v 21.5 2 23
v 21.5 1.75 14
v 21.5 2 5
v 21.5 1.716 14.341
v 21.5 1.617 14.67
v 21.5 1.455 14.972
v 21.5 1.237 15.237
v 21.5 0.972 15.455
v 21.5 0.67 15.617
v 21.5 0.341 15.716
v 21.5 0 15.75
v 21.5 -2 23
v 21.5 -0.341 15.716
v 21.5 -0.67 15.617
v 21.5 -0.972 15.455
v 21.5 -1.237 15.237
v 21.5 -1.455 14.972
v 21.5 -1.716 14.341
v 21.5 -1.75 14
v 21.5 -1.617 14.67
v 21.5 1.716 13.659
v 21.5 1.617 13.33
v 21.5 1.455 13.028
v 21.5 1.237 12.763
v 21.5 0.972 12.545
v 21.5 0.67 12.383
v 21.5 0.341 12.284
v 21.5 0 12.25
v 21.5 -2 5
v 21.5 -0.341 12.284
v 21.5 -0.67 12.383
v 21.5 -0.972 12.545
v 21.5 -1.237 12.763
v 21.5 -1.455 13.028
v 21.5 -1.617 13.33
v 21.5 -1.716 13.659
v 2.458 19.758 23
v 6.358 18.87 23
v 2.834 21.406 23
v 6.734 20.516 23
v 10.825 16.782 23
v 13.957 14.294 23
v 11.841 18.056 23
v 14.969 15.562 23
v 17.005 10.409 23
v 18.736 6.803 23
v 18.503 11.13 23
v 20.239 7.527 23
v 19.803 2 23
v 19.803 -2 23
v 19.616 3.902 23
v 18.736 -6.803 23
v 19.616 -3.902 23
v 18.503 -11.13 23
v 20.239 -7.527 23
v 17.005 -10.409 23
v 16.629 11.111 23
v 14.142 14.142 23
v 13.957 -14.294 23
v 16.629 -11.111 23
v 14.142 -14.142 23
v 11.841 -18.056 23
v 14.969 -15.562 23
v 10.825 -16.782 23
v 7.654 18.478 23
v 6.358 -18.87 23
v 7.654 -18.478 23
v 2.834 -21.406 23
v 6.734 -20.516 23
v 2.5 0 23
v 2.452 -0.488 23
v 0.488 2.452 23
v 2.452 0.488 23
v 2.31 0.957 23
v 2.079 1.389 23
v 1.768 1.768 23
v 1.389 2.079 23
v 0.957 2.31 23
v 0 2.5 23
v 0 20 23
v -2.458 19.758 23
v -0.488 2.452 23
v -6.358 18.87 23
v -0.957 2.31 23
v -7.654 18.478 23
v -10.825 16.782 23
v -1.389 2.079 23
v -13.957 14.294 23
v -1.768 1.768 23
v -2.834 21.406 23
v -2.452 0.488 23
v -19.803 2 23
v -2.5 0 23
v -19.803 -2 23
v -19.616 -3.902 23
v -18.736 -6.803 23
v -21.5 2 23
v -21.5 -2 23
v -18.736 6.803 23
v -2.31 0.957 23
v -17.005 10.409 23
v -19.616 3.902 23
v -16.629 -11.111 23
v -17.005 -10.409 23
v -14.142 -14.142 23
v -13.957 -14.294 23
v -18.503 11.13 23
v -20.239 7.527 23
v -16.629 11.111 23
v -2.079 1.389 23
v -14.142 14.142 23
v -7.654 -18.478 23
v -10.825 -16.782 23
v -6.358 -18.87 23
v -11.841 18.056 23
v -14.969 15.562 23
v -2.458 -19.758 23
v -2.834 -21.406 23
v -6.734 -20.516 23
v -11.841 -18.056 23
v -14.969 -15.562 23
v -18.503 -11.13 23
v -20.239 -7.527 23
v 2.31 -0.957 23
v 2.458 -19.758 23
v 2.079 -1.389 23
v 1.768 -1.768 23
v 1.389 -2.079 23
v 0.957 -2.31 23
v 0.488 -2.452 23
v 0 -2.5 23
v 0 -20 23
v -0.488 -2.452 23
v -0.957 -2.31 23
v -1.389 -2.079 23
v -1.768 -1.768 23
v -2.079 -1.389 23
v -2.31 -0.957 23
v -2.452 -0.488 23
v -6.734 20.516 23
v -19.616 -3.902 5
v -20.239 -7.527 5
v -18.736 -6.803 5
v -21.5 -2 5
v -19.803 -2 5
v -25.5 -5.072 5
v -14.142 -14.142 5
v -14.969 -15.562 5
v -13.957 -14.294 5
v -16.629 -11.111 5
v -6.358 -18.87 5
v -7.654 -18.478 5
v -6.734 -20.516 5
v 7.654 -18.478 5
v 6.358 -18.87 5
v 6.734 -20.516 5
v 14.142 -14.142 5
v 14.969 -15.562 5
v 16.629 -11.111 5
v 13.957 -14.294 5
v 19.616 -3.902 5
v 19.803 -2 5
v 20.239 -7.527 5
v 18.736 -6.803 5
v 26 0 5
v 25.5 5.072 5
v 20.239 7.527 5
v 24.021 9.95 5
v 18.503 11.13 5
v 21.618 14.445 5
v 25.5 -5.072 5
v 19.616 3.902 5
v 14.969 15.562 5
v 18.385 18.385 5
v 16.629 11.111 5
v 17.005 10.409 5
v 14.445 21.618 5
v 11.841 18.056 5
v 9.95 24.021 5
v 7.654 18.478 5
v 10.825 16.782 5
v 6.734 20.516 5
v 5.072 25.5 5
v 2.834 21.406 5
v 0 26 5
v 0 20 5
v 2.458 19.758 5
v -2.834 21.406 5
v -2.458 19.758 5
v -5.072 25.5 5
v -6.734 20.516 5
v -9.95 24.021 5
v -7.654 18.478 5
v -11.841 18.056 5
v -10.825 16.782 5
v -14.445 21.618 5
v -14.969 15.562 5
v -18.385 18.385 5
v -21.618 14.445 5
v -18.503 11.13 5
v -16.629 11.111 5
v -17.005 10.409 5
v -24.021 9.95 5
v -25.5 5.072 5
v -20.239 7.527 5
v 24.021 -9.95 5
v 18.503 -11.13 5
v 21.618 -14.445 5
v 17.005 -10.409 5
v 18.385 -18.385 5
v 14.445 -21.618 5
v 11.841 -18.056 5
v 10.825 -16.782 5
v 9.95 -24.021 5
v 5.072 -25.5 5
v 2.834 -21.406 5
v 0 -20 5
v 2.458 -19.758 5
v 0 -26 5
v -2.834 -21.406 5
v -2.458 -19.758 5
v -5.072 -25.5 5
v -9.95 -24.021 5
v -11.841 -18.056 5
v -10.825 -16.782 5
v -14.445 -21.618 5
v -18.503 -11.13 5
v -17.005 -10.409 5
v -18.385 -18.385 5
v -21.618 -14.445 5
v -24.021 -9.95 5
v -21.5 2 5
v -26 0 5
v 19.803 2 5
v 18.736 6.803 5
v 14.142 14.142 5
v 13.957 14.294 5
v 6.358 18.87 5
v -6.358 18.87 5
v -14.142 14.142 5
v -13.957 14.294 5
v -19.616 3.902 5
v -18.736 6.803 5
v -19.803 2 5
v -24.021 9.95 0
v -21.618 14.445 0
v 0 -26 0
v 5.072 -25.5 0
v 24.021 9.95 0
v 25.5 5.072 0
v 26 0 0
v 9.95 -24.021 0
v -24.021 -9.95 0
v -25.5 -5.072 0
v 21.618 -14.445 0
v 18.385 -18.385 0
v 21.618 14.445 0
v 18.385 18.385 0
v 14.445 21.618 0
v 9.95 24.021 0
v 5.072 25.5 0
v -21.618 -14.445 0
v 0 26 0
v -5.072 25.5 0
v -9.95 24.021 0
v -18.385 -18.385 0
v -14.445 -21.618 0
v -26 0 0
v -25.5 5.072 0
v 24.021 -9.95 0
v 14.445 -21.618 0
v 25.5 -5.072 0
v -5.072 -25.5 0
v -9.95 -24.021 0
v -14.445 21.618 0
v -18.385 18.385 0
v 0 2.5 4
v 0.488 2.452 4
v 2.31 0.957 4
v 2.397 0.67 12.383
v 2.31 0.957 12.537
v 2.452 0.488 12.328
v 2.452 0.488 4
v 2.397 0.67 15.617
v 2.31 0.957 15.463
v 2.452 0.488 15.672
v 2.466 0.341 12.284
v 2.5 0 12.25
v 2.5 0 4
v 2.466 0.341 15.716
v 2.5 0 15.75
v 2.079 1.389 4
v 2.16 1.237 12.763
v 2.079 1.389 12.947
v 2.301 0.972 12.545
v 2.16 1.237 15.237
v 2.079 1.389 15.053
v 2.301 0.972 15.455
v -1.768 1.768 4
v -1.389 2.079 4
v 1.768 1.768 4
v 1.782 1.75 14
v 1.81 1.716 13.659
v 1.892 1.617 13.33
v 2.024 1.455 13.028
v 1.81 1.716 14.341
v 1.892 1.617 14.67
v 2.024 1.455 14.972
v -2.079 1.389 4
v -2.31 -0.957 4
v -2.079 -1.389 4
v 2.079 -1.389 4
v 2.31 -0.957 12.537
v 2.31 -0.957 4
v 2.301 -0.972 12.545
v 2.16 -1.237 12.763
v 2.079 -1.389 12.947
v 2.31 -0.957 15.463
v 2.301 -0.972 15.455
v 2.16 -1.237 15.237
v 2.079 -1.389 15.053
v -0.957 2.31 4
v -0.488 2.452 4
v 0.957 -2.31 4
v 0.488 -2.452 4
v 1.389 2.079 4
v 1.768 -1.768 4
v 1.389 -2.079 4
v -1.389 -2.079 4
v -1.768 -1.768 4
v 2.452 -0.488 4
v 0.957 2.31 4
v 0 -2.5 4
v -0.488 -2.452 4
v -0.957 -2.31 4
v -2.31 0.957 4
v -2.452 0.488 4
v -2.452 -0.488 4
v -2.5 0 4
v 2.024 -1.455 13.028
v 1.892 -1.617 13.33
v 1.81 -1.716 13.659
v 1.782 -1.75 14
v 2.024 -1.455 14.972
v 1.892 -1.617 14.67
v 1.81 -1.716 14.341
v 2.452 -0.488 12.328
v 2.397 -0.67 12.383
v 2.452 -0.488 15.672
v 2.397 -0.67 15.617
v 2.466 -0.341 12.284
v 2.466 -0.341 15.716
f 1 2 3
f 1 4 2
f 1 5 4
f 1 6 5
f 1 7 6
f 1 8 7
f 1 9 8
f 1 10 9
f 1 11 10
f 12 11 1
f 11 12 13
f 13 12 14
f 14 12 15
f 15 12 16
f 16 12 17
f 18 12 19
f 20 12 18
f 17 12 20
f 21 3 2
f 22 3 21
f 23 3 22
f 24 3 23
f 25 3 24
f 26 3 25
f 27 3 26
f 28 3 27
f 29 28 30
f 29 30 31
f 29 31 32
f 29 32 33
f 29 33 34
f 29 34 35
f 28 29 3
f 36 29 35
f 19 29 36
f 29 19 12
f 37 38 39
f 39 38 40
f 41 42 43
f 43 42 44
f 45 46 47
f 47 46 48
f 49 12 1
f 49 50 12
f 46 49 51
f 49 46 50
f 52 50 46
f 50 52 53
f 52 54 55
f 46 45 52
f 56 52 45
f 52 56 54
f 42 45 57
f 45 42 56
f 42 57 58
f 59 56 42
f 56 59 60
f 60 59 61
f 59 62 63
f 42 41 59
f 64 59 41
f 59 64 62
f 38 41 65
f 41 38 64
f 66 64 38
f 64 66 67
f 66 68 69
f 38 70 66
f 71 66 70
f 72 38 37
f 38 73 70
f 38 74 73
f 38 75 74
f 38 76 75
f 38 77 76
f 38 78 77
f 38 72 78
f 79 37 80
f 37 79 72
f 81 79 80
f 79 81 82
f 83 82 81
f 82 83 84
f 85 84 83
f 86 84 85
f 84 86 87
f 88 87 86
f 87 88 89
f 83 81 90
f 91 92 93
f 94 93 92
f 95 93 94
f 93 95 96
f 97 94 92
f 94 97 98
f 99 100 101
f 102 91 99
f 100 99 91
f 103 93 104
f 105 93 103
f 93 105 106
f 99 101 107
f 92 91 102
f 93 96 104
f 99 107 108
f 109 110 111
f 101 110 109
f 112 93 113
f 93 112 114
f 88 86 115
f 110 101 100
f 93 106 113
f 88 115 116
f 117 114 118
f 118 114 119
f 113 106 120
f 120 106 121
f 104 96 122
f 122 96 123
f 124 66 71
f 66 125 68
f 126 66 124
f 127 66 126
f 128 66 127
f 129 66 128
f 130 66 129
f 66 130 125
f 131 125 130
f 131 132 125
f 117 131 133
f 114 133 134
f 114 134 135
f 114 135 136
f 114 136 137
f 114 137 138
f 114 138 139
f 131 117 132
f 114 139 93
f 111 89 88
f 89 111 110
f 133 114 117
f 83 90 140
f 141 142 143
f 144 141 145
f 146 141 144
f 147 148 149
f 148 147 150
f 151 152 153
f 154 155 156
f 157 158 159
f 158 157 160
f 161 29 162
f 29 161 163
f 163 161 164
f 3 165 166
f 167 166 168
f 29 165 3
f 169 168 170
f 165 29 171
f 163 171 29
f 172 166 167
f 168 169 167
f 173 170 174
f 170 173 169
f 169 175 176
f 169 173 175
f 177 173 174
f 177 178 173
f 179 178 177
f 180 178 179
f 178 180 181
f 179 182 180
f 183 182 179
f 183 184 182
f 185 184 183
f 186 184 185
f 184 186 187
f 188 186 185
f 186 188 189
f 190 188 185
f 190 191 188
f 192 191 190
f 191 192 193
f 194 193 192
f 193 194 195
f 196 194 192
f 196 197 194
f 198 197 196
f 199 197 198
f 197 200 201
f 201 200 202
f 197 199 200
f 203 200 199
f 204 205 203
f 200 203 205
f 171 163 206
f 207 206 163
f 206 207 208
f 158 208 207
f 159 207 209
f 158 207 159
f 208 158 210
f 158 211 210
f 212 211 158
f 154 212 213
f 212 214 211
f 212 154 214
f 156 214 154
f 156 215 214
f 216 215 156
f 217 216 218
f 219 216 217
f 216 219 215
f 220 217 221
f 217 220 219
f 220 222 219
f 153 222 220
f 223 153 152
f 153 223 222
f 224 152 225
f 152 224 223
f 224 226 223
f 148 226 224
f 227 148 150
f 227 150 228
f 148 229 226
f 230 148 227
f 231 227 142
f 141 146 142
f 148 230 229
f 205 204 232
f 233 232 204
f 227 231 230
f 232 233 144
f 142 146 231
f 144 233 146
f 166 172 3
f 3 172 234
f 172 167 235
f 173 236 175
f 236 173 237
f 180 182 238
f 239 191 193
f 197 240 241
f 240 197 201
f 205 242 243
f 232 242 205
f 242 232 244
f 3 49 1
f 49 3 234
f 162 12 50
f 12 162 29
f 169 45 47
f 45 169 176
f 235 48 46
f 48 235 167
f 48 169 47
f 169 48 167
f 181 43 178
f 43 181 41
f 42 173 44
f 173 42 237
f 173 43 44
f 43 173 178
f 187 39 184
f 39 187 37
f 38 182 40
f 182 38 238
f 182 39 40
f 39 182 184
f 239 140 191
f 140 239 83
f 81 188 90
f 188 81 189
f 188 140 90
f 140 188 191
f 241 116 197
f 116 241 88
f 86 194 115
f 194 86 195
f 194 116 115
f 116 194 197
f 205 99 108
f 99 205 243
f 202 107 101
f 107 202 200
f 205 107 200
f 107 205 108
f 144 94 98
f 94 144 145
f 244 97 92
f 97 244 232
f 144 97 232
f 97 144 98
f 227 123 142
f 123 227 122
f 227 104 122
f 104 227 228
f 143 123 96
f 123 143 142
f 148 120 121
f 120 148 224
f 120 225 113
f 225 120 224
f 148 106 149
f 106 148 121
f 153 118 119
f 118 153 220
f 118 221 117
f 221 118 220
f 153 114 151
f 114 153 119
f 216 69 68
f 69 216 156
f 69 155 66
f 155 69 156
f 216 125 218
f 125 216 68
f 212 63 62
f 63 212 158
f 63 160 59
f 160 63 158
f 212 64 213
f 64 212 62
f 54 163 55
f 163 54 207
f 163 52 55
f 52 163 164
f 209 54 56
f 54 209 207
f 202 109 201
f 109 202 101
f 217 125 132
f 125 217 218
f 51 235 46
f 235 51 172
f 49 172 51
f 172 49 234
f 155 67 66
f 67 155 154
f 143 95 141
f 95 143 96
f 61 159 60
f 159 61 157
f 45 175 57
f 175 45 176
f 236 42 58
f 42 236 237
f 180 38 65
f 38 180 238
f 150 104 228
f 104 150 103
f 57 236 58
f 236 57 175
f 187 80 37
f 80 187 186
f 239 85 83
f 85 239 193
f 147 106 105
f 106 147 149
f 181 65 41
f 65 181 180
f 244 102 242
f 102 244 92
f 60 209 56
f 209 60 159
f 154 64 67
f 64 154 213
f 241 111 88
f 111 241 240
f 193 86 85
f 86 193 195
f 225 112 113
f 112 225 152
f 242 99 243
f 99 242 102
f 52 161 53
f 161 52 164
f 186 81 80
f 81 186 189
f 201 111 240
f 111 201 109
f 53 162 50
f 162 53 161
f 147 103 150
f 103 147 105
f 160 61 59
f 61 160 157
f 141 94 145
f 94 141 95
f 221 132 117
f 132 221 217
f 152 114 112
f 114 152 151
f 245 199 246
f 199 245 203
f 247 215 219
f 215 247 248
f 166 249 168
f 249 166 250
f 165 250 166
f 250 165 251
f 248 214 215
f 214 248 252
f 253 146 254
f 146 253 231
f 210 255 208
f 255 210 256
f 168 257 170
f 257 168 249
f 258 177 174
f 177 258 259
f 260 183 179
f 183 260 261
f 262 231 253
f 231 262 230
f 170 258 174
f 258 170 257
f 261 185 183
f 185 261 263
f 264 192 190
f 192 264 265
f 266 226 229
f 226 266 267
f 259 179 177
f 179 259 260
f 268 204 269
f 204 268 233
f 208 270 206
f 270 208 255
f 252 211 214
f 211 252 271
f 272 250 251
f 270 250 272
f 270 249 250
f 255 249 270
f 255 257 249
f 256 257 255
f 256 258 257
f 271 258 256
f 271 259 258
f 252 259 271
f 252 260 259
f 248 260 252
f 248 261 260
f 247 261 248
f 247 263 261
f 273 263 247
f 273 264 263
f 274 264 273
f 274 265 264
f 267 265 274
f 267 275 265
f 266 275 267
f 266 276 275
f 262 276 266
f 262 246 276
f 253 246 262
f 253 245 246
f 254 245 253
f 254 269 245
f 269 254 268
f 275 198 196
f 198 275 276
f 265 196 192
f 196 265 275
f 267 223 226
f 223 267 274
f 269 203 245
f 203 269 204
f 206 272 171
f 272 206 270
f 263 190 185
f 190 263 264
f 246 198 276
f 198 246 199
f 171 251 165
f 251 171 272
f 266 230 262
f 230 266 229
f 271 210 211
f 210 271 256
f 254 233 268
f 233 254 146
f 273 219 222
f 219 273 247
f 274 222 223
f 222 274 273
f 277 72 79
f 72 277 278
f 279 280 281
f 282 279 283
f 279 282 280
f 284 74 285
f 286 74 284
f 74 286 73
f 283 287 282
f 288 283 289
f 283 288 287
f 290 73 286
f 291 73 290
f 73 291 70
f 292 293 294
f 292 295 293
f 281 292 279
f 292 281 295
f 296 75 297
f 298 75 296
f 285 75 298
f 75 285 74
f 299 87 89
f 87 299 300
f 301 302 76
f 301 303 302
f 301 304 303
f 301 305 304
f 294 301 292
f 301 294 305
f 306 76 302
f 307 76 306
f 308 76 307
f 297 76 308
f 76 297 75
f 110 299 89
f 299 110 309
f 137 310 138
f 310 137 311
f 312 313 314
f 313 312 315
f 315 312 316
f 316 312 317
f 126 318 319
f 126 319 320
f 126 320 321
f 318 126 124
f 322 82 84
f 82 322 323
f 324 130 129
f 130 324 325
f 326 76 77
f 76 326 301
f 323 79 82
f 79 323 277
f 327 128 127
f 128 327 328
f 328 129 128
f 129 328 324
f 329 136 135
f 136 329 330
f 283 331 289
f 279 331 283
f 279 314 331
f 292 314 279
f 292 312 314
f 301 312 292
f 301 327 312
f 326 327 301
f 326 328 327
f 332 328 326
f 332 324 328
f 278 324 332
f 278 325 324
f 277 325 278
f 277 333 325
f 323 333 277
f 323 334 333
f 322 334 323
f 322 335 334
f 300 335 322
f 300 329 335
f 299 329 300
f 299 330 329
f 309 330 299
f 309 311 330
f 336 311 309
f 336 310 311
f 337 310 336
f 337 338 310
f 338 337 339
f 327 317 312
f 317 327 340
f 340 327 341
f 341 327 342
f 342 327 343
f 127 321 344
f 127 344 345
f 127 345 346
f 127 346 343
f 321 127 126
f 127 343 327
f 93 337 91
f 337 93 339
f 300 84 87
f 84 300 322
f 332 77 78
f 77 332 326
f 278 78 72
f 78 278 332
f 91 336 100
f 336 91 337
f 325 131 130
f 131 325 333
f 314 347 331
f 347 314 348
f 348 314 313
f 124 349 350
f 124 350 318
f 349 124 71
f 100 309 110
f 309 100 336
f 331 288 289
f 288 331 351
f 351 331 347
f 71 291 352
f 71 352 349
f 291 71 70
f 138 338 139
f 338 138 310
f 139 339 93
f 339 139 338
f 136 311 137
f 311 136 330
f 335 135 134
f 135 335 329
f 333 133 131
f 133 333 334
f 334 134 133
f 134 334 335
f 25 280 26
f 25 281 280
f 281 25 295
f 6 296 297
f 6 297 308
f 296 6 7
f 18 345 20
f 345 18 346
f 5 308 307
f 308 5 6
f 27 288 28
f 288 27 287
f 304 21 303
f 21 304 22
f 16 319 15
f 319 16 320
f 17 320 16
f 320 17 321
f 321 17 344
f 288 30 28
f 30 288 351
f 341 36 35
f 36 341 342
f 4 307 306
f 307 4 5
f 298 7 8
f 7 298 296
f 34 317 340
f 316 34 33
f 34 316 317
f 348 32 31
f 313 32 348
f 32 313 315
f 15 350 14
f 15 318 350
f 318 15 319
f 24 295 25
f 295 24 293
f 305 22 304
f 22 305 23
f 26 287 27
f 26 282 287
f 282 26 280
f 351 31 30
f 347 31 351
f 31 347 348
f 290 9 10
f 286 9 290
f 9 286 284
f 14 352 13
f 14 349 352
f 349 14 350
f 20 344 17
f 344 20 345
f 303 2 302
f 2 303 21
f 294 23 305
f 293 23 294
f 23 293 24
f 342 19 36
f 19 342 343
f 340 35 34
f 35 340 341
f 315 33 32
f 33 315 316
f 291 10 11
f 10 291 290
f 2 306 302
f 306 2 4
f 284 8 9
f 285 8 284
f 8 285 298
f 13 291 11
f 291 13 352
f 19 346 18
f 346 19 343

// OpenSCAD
$fn = 32;

// ----------------------------------------------------------------------
// Control knob: skirt knob with grip ribs
// ----------------------------------------------------------------------

// --- parameters (mm) ---
skirt_d = 52;             // skirt diameter
skirt_t = 5;              // skirt thickness
rib_w = 4;                // grip rib width
rib_out = 2.5;            // grip rib radial protrusion
n_ribs = 14;              // number of grip ribs
knob_d = 40;              // knob body diameter
knob_h = 18;              // knob body height
bore_d = 5;               // shaft bore diameter
set_d = 3.5;              // set screw bore diameter

rib_step = 360 / n_ribs;  // rib angular step
total_h = skirt_t + knob_h;  // overall height

difference() {
  union() {
    translate([0, 0, skirt_t]) cylinder(h = knob_h, d = knob_d);
    cylinder(h = skirt_t, d = skirt_d);
    for (i = [0 : n_ribs - 1])
      rotate([0, 0, i * rib_step])
        translate([knob_d / 2 - 1, -rib_w / 2, skirt_t])
          cube([rib_out, rib_w, knob_h]);
  }
  translate([0, 0, skirt_t - 1]) cylinder(h = knob_h + 2, d = bore_d);
  translate([-1, 0, skirt_t + knob_h / 2]) rotate([0, 90, 0])
    cylinder(h = knob_d / 2 + bore_d / 2 + 2, d = set_d);
}
